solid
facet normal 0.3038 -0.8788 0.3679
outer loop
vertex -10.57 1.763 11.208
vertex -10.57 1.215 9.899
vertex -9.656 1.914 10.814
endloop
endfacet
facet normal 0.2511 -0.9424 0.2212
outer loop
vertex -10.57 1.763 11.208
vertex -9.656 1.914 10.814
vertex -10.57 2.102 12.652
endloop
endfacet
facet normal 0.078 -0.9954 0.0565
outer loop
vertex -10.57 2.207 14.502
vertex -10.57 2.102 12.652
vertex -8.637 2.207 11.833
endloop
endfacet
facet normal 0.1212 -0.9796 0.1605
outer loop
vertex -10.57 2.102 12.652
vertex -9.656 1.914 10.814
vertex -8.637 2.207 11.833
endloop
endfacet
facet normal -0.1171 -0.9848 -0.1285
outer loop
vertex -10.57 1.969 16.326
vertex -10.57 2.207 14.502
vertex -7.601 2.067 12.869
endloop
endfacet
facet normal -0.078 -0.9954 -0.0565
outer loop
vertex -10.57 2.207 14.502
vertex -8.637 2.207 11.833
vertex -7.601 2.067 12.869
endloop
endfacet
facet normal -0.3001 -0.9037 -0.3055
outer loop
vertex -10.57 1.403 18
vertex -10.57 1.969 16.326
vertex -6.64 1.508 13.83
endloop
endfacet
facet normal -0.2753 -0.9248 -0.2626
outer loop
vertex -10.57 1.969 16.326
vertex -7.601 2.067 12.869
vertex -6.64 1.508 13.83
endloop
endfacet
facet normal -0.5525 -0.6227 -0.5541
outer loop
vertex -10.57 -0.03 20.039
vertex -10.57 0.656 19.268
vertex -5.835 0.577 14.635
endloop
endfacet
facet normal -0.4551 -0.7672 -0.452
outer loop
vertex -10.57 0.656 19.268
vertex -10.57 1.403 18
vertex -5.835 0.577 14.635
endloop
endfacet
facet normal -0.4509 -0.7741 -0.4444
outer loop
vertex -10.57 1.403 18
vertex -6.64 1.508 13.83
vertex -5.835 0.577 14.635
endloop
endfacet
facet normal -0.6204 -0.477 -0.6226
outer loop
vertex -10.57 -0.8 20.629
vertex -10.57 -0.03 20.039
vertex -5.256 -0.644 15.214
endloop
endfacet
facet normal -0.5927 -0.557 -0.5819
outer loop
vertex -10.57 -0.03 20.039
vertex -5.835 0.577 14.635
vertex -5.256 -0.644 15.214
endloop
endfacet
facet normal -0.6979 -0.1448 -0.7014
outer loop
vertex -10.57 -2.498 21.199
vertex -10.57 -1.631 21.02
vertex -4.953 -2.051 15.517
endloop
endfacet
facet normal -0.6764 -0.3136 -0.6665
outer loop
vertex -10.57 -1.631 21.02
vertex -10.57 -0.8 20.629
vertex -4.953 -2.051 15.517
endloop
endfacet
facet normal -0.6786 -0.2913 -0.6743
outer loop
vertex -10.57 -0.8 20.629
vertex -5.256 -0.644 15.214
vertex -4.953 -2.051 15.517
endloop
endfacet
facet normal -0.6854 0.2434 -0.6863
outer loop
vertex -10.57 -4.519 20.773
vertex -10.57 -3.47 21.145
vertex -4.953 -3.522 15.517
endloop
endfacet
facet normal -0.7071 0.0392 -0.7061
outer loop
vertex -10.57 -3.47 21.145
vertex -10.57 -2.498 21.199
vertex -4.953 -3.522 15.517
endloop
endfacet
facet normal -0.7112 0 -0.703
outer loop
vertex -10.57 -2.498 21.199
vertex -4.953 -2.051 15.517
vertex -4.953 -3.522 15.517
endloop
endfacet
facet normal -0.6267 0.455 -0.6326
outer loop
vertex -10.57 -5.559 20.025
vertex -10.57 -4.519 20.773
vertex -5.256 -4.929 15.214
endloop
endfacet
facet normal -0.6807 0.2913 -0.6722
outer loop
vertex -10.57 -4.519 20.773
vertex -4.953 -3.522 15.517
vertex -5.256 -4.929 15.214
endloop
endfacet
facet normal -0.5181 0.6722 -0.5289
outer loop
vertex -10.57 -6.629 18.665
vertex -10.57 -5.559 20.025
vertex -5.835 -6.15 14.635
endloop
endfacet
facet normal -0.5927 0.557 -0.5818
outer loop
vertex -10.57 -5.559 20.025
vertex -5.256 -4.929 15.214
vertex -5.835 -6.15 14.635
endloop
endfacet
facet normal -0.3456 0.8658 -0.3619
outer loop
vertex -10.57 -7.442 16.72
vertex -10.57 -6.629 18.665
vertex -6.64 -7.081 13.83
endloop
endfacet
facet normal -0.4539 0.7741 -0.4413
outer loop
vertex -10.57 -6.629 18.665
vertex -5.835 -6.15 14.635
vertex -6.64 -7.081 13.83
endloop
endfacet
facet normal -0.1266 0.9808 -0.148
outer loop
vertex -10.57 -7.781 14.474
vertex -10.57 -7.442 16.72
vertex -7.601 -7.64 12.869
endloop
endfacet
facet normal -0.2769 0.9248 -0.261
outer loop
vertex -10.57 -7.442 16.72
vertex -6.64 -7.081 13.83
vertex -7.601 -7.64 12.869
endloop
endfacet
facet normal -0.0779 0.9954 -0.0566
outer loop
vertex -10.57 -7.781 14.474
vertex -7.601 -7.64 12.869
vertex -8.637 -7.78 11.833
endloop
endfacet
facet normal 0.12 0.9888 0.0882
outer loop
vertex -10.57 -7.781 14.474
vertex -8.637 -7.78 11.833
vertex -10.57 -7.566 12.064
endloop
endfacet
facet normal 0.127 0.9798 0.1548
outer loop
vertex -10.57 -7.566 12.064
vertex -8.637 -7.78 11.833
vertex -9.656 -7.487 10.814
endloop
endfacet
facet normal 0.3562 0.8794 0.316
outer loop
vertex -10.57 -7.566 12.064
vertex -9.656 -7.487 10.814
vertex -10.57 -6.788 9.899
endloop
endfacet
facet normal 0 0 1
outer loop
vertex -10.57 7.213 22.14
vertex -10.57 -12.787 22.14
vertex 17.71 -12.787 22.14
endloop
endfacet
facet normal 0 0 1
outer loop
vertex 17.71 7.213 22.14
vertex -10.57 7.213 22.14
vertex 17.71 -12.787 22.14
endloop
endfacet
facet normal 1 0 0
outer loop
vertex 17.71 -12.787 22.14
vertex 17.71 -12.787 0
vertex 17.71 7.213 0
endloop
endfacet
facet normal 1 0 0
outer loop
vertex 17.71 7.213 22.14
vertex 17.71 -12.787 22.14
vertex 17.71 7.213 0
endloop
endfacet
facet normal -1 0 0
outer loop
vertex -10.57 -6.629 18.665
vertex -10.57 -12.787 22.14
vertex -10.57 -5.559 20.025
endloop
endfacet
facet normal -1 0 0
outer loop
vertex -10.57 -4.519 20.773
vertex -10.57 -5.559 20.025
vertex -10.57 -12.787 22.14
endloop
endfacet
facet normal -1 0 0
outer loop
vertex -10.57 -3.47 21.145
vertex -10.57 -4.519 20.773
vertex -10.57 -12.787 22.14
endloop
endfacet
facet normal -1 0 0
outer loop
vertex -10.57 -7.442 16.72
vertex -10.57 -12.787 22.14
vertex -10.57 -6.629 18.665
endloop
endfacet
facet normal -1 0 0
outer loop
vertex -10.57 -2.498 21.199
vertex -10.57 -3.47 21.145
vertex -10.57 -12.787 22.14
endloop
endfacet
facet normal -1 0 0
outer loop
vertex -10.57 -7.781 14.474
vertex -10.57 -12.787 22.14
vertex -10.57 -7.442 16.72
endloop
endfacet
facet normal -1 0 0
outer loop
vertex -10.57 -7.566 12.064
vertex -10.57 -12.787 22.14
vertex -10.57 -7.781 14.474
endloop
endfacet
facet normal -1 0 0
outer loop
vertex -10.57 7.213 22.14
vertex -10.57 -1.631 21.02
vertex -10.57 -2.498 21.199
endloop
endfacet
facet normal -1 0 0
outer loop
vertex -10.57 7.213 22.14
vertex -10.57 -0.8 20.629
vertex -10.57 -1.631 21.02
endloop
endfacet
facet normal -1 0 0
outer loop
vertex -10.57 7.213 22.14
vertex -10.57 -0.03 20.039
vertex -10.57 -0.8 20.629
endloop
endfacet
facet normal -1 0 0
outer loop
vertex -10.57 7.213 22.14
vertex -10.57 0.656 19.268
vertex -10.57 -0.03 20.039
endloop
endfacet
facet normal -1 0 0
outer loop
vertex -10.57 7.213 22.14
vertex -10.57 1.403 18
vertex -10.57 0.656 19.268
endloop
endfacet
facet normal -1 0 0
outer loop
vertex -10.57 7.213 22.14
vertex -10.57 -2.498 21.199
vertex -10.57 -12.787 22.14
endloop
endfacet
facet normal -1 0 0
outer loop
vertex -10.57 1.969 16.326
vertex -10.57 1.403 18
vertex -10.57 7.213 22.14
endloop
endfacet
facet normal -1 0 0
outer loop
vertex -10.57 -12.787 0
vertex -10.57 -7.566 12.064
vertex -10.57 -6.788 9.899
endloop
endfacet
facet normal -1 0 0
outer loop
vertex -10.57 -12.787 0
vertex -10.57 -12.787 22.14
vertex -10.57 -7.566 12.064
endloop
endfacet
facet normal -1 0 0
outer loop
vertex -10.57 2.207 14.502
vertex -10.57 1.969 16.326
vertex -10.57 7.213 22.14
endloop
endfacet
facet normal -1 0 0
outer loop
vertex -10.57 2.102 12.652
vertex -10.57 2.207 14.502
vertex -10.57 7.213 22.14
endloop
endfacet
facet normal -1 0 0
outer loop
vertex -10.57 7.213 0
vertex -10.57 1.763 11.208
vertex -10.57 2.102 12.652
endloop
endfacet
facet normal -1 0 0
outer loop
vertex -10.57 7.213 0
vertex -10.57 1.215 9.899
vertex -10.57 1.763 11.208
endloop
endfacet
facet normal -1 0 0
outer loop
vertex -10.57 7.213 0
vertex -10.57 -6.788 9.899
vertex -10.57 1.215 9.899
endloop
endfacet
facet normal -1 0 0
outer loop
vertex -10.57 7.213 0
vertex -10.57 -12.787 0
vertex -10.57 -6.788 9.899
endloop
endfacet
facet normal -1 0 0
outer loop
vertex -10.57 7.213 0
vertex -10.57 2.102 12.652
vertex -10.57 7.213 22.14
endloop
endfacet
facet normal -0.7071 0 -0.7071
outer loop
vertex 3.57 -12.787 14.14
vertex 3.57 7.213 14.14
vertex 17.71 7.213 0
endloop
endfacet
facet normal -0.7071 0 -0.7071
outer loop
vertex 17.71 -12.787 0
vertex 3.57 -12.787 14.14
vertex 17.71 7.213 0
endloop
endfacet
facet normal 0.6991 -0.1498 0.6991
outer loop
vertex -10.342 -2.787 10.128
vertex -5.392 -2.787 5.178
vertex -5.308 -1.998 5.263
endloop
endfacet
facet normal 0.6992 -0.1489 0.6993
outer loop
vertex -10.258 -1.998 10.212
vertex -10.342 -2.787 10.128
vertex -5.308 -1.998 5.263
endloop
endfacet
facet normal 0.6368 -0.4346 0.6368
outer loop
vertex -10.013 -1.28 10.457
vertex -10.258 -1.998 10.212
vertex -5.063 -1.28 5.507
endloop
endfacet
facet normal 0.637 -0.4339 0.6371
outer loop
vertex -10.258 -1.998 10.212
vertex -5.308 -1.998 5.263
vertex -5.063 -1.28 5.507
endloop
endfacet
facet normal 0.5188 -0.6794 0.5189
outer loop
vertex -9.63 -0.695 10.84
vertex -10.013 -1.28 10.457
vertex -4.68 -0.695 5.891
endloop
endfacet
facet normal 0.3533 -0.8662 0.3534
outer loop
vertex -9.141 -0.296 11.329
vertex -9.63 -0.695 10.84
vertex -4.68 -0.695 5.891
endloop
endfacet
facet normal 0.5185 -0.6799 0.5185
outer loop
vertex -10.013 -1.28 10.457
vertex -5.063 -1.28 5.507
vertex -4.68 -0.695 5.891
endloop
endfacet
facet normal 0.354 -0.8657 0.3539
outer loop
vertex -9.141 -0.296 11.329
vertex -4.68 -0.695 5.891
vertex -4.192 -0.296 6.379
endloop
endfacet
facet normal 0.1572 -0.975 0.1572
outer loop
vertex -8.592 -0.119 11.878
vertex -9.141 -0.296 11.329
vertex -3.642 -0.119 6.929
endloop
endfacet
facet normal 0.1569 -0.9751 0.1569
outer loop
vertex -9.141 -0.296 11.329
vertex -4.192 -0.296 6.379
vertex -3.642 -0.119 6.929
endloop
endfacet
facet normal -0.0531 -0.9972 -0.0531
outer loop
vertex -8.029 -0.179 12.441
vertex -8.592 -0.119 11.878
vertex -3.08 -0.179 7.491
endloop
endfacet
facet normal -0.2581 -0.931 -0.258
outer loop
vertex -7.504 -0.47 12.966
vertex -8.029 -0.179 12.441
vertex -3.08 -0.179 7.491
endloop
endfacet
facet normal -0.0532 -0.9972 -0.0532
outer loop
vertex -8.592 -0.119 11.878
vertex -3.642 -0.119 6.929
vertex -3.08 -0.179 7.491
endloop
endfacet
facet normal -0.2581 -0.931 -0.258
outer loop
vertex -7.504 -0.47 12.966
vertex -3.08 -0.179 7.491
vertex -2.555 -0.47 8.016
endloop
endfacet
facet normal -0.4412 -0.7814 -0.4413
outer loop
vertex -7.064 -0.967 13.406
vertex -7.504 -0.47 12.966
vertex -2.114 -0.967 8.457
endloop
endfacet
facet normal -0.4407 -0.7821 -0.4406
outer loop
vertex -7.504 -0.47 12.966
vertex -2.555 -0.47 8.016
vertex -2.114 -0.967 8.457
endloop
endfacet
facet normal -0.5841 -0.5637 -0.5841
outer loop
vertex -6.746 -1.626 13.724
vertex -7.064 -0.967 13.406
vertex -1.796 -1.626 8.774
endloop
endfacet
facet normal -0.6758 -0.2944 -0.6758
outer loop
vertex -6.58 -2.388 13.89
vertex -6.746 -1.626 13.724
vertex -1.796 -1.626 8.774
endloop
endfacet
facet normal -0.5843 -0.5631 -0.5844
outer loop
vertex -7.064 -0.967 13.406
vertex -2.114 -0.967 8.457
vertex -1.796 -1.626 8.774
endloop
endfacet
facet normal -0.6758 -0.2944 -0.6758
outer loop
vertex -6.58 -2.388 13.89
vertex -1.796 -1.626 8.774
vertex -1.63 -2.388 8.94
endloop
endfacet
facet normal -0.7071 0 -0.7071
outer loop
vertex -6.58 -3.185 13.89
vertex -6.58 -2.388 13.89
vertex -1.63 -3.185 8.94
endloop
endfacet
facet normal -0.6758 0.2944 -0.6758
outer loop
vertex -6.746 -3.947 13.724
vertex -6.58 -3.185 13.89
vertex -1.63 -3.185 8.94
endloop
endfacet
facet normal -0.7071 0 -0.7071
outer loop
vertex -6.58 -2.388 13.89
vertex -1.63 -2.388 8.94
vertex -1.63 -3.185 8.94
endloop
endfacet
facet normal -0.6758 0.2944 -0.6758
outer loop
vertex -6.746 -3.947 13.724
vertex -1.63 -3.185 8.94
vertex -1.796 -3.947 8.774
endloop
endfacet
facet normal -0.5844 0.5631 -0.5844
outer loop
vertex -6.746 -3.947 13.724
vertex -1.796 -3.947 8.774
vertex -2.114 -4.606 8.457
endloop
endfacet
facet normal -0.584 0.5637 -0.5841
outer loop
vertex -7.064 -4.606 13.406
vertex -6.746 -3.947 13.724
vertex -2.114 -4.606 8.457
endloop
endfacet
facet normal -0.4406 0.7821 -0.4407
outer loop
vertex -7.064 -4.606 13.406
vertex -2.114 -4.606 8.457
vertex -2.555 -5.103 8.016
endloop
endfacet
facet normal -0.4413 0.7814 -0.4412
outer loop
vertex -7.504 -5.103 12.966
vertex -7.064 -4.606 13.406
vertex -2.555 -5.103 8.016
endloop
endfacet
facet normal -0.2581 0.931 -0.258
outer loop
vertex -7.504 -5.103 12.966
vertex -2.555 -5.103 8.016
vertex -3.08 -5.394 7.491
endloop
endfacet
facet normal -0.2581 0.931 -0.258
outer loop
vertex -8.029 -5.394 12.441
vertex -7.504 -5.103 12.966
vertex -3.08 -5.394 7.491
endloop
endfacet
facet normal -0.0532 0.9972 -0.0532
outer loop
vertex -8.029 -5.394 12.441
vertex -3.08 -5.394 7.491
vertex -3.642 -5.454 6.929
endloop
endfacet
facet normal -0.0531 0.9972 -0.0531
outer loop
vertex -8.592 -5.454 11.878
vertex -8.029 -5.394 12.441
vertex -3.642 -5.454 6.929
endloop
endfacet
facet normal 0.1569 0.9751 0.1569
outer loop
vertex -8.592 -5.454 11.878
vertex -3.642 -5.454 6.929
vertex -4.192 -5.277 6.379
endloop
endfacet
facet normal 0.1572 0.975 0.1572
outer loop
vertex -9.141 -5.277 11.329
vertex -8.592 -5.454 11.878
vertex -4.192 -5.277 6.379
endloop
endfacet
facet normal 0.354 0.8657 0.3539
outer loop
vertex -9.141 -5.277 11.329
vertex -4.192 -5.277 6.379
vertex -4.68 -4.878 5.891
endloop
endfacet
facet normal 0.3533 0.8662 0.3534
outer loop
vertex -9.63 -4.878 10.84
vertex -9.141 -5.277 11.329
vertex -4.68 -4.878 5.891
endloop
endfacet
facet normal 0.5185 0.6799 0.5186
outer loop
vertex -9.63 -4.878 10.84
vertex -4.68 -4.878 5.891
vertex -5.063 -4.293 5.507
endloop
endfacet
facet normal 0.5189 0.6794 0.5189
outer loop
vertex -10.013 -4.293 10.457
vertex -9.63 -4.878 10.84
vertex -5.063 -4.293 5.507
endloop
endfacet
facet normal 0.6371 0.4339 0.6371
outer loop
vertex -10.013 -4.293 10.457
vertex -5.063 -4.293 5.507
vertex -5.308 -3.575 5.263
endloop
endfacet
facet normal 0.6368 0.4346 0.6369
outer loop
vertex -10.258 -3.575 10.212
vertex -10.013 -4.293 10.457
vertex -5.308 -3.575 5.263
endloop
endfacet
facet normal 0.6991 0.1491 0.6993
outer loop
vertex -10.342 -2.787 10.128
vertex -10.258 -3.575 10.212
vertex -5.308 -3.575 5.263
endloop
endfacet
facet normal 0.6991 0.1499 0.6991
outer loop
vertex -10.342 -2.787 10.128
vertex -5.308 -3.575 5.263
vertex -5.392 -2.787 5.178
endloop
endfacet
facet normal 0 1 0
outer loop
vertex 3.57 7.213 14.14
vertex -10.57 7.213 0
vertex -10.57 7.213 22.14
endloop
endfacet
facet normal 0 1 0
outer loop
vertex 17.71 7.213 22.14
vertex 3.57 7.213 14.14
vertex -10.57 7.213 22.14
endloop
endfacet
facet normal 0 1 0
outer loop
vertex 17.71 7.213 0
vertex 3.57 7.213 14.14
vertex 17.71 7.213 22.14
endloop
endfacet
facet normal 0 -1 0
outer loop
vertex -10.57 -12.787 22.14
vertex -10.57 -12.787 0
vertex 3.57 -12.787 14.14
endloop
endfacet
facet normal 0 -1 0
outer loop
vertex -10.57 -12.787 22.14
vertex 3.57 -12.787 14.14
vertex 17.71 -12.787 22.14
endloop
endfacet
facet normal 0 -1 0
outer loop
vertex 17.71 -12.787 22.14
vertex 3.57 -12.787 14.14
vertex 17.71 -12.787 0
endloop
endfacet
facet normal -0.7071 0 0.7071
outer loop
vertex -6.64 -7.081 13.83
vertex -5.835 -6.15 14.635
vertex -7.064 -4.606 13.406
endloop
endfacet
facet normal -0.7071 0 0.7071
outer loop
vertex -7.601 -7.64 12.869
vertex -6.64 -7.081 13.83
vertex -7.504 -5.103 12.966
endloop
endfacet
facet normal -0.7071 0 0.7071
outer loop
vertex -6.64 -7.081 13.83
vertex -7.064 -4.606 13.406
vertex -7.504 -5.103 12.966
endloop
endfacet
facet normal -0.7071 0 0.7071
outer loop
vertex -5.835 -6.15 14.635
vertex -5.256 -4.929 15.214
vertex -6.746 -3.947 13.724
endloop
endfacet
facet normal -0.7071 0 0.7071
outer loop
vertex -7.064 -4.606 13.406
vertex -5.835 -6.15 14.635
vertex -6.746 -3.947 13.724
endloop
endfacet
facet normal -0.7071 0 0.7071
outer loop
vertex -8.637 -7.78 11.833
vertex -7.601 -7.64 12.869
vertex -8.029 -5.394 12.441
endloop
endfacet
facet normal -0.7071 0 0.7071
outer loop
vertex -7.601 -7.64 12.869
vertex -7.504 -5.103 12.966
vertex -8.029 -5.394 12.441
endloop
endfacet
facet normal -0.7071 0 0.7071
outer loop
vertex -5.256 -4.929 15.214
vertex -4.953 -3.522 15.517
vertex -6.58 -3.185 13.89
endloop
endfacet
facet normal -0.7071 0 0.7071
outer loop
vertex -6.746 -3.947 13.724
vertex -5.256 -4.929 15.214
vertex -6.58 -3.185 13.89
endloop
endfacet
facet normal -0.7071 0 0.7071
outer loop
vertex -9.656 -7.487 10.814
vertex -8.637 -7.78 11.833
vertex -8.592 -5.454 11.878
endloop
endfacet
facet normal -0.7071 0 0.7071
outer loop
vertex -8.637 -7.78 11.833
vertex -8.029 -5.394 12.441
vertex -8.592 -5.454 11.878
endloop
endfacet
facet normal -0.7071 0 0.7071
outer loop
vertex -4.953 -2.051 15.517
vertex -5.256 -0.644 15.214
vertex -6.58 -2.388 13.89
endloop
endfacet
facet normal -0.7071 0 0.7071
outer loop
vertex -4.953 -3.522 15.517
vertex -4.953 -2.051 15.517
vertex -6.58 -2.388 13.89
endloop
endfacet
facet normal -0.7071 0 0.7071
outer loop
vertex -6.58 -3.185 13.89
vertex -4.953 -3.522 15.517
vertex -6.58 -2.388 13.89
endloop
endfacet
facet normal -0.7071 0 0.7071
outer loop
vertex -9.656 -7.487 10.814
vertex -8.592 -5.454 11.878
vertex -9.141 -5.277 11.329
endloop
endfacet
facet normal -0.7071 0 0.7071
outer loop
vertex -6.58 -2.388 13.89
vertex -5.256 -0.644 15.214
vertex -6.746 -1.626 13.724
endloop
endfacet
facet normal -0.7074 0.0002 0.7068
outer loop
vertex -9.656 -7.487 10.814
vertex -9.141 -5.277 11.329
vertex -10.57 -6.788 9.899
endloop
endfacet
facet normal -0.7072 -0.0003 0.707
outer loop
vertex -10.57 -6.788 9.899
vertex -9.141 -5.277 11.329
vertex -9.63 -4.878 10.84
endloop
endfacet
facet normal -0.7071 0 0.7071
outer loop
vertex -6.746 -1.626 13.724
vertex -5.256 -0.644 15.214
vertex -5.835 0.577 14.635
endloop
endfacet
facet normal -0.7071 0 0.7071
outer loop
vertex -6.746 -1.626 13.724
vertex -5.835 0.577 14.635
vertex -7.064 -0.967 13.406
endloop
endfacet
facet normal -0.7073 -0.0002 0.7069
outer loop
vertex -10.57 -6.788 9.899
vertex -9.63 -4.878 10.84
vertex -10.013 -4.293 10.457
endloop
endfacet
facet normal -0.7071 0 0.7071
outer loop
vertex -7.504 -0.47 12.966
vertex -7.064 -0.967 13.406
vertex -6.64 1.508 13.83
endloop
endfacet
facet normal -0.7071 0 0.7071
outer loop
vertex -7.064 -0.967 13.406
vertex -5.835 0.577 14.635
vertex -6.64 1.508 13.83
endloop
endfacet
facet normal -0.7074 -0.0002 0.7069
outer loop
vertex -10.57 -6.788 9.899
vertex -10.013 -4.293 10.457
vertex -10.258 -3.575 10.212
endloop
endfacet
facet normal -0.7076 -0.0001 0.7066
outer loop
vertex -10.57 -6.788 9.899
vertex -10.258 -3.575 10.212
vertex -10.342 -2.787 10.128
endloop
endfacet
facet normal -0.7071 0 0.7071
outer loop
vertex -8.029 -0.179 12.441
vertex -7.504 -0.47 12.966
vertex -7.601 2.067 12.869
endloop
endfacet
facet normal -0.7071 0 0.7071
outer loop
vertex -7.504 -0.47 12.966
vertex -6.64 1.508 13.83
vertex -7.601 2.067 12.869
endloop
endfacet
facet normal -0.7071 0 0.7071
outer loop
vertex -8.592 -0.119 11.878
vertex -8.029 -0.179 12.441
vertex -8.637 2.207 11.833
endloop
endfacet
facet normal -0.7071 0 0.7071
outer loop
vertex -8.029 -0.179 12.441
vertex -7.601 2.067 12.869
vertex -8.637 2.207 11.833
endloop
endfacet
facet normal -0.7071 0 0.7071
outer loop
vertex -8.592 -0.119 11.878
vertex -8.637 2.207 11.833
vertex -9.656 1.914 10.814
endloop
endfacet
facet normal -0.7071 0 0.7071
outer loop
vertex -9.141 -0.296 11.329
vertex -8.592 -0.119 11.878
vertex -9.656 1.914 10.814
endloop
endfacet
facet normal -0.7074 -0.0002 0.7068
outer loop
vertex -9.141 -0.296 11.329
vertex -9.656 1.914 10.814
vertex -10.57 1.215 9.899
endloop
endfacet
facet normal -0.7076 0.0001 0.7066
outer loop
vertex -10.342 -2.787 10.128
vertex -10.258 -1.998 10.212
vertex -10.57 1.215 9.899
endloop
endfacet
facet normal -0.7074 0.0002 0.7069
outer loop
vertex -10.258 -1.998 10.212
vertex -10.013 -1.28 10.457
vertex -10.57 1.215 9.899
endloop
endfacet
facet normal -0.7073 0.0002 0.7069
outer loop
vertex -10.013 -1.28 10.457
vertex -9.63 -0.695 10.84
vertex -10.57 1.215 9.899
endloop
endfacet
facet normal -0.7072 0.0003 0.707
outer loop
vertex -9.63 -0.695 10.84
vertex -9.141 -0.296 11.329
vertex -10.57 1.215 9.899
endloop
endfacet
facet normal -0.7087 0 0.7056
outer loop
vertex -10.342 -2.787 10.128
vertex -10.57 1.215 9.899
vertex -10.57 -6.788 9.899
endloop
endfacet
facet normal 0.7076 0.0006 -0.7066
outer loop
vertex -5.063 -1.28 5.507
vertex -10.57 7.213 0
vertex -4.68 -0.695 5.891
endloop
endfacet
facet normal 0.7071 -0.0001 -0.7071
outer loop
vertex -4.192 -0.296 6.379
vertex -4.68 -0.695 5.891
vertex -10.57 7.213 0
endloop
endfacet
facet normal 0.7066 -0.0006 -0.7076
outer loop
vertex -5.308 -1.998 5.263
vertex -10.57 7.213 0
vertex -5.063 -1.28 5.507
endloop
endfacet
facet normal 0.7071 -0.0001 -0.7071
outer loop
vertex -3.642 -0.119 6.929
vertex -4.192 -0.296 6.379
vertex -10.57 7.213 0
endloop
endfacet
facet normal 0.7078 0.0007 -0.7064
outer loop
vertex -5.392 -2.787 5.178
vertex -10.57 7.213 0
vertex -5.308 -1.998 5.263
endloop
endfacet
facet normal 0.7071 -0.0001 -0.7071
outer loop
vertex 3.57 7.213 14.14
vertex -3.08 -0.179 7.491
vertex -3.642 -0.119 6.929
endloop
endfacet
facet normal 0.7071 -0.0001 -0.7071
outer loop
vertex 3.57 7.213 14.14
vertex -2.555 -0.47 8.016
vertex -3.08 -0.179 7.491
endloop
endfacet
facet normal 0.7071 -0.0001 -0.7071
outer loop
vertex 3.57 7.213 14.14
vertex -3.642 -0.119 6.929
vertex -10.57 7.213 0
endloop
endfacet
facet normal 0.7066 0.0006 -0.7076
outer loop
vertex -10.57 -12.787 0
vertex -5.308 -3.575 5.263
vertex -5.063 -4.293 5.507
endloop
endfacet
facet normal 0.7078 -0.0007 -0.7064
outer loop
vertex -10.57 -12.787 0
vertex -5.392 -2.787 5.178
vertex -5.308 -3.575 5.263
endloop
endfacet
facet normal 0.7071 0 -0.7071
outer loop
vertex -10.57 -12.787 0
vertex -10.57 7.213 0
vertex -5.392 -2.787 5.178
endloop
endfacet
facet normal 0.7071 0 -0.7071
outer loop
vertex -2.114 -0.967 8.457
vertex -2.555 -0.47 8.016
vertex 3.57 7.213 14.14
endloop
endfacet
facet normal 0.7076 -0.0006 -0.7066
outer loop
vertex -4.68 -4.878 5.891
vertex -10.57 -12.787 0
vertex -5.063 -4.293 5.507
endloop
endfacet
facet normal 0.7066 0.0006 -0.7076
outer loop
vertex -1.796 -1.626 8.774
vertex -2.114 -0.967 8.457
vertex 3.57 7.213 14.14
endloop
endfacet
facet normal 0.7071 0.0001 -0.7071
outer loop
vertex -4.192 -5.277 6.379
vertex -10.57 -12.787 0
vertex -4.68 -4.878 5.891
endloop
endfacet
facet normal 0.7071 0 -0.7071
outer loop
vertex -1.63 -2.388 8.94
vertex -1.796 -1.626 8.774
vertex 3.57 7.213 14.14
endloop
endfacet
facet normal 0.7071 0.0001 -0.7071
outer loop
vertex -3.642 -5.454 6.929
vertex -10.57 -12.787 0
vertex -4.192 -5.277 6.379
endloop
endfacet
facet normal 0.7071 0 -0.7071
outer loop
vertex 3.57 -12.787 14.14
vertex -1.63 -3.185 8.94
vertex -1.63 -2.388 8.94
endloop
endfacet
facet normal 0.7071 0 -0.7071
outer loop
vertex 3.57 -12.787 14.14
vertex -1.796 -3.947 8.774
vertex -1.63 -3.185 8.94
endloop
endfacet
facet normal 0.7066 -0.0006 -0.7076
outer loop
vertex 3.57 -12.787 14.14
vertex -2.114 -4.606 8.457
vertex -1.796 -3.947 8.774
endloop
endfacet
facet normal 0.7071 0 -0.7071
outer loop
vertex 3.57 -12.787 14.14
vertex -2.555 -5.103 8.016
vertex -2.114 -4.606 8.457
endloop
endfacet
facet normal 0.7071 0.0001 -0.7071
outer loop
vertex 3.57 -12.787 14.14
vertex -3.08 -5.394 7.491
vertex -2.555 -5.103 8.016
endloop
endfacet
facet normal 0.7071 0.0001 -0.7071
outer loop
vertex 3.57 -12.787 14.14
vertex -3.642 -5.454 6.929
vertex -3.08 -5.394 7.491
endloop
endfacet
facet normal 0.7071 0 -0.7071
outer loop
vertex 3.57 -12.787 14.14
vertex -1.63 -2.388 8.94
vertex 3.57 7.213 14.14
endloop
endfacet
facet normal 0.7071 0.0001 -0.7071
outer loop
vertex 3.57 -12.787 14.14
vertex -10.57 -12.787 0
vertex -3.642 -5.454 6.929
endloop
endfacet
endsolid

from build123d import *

# Parameters (mm, degrees)
SKETCH1_W           = 28.28
SKETCH1_H           = 20
BOSS_EXTRUDE1_DEPTH = 40
SKETCH2_W           = 28.28
SKETCH2_H           = 17.86
CUT_EXTRUDE1_DEPTH  = 29
SKETCH3_R           = 2.675
CUT_EXTRUDE2_DEPTH  = 19
CUT_EXTRUDE3_START  = -7
SKETCH4_R           = 5
CUT_EXTRUDE3_DEPTH  = 19


with BuildPart() as part:
    # Sketch1 → Boss-Extrude1 (new body)
    with BuildSketch(Plane.XY):
        with Locations((3.569509613, -2.786541121)):
            Rectangle(SKETCH1_W, SKETCH1_H)
    extrude(amount=BOSS_EXTRUDE1_DEPTH)

    # Sketch2 → Cut-Extrude1 (cut)
    with BuildSketch(Plane.XZ.offset(12.786541121)):
        Polygon((-10.570490387, 0), (3.569509613, 14.14), (17.709509613, 0), align=None)
        with Locations((3.569509613, 31.07)):
            Rectangle(SKETCH2_W, SKETCH2_H)
    extrude(amount=-CUT_EXTRUDE1_DEPTH, mode=Mode.SUBTRACT)

    # Sketch3 → Cut-Extrude2 (cut)
    with BuildSketch(Plane(origin=(-5.285245194, 0, 5.285245194), x_dir=(-0.707106781186544, 0, -0.7071067811865511), z_dir=(0.7071067811865511, 0, -0.707106781186544))):
        with Locations((-2.524024453, -2.786541121)):
            Circle(SKETCH3_R)
    extrude(amount=-CUT_EXTRUDE2_DEPTH, mode=Mode.SUBTRACT)

    # Sketch4 → Cut-Extrude3 (cut)
    with BuildSketch(Plane(origin=(-5.285245194, 0, 5.285245194), x_dir=(-0.707106781186544, 0, -0.7071067811865511), z_dir=(0.7071067811865511, 0, -0.707106781186544)).offset(CUT_EXTRUDE3_START)):
        with Locations((-2.524024453, -2.786541121)):
            Circle(SKETCH4_R)
    extrude(amount=-CUT_EXTRUDE3_DEPTH, mode=Mode.SUBTRACT)


solid = part.part
